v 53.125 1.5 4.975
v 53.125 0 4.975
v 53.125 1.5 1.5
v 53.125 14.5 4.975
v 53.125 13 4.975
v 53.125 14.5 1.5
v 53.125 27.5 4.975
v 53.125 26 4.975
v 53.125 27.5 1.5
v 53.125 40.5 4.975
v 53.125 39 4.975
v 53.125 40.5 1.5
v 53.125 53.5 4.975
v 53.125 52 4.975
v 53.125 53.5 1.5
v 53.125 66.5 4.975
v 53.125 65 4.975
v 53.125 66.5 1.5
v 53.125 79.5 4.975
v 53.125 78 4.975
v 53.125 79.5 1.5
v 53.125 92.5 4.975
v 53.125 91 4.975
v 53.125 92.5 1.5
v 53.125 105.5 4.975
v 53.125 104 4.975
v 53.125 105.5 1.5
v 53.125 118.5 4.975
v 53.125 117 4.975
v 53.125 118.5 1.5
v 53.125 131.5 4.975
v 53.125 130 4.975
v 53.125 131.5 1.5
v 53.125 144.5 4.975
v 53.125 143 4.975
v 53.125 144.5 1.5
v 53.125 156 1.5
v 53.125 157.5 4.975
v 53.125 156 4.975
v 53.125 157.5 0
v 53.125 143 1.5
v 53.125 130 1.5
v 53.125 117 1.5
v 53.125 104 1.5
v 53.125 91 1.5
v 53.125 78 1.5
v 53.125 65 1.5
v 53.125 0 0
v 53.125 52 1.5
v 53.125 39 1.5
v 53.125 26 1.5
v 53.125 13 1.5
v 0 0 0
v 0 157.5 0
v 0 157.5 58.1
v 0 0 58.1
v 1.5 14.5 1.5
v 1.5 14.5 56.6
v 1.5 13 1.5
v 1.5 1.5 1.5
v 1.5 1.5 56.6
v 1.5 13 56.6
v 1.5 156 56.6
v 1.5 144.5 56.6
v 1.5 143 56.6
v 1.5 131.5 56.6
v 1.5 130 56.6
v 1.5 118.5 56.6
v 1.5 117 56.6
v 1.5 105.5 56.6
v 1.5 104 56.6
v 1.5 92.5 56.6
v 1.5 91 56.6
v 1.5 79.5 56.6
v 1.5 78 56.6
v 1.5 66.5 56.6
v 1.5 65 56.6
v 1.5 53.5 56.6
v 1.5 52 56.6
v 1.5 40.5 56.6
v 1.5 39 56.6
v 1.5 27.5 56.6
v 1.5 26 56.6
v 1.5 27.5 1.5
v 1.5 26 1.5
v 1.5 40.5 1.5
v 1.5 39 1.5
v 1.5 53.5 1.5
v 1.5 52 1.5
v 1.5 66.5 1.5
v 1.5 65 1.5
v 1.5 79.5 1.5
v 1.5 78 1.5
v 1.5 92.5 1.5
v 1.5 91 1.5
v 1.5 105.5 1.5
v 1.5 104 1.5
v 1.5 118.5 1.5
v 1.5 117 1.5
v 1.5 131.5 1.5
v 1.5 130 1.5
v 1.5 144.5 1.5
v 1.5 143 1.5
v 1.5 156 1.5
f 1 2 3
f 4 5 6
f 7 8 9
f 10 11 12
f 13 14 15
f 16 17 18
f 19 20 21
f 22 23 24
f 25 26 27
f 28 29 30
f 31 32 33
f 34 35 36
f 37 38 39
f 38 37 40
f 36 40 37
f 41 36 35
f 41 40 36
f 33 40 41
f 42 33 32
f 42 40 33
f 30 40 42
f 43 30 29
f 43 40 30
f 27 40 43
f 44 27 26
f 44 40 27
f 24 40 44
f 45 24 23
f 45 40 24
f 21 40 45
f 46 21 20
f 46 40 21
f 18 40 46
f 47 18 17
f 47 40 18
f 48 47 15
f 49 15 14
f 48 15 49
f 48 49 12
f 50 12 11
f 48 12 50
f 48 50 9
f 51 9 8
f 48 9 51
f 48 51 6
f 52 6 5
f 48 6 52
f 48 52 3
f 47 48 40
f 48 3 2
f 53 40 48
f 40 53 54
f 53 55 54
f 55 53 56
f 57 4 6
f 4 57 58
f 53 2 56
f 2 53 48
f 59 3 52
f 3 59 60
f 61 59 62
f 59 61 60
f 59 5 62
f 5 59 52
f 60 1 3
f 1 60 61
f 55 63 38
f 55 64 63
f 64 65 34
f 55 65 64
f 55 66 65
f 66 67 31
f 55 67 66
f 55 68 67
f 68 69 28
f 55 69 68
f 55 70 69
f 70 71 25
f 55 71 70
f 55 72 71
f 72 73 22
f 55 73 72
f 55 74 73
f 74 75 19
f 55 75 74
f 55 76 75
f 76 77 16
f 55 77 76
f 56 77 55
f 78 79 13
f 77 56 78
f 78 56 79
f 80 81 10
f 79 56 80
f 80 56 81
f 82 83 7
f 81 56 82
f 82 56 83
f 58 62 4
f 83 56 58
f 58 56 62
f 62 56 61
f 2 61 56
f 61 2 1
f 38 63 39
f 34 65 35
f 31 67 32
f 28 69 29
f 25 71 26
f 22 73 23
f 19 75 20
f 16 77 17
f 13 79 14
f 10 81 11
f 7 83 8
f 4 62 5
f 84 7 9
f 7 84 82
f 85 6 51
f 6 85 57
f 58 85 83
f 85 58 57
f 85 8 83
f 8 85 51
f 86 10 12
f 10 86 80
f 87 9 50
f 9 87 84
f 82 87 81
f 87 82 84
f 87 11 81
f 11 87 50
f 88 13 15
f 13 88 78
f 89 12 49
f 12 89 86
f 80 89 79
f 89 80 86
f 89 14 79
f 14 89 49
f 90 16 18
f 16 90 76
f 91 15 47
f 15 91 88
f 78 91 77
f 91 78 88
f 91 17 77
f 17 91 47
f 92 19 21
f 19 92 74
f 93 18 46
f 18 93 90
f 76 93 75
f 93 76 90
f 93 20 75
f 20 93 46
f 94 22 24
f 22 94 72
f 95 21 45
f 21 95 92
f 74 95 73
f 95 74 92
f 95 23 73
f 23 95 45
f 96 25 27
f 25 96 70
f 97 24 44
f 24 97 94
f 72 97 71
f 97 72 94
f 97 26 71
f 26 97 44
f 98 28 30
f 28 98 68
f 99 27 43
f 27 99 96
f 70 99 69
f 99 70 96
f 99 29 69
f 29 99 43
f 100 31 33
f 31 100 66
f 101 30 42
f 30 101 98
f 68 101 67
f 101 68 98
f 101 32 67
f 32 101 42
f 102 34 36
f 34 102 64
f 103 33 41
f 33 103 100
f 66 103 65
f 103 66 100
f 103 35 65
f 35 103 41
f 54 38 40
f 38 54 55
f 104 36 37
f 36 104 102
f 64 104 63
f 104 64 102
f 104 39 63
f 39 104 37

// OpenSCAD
slots = 12;
box = "Switch";
//box = "PS4";
//box = "XBox";

thick = 1.5;
height = 56.6;
length = 51.625;
y=100;

if (box=="Switch") Make_Holder(11.5);
else if (box=="PS4") Make_Holder(15.3);
else if (box=="XBox")Make_Holder(16);

module Game_Slot (width) {
    difference() {
        cube([length+thick,width+thick*2,height+thick]);
        translate ([thick,thick,thick]) cube ([length,width,height]);
        translate([0,0,height+thick])rotate ([0,45,0])cube([y+thick,width+thick*2,y]);
    }
}

module Make_Holder(width) {
    for(x = [0:1:slots-1]) {
        translate ([0,width*x+thick*x,0])Game_Slot(width);
    }
    }

//Designed by Cyberandrew03, https://www.thingiverse.com/Cyberandrew03/about
